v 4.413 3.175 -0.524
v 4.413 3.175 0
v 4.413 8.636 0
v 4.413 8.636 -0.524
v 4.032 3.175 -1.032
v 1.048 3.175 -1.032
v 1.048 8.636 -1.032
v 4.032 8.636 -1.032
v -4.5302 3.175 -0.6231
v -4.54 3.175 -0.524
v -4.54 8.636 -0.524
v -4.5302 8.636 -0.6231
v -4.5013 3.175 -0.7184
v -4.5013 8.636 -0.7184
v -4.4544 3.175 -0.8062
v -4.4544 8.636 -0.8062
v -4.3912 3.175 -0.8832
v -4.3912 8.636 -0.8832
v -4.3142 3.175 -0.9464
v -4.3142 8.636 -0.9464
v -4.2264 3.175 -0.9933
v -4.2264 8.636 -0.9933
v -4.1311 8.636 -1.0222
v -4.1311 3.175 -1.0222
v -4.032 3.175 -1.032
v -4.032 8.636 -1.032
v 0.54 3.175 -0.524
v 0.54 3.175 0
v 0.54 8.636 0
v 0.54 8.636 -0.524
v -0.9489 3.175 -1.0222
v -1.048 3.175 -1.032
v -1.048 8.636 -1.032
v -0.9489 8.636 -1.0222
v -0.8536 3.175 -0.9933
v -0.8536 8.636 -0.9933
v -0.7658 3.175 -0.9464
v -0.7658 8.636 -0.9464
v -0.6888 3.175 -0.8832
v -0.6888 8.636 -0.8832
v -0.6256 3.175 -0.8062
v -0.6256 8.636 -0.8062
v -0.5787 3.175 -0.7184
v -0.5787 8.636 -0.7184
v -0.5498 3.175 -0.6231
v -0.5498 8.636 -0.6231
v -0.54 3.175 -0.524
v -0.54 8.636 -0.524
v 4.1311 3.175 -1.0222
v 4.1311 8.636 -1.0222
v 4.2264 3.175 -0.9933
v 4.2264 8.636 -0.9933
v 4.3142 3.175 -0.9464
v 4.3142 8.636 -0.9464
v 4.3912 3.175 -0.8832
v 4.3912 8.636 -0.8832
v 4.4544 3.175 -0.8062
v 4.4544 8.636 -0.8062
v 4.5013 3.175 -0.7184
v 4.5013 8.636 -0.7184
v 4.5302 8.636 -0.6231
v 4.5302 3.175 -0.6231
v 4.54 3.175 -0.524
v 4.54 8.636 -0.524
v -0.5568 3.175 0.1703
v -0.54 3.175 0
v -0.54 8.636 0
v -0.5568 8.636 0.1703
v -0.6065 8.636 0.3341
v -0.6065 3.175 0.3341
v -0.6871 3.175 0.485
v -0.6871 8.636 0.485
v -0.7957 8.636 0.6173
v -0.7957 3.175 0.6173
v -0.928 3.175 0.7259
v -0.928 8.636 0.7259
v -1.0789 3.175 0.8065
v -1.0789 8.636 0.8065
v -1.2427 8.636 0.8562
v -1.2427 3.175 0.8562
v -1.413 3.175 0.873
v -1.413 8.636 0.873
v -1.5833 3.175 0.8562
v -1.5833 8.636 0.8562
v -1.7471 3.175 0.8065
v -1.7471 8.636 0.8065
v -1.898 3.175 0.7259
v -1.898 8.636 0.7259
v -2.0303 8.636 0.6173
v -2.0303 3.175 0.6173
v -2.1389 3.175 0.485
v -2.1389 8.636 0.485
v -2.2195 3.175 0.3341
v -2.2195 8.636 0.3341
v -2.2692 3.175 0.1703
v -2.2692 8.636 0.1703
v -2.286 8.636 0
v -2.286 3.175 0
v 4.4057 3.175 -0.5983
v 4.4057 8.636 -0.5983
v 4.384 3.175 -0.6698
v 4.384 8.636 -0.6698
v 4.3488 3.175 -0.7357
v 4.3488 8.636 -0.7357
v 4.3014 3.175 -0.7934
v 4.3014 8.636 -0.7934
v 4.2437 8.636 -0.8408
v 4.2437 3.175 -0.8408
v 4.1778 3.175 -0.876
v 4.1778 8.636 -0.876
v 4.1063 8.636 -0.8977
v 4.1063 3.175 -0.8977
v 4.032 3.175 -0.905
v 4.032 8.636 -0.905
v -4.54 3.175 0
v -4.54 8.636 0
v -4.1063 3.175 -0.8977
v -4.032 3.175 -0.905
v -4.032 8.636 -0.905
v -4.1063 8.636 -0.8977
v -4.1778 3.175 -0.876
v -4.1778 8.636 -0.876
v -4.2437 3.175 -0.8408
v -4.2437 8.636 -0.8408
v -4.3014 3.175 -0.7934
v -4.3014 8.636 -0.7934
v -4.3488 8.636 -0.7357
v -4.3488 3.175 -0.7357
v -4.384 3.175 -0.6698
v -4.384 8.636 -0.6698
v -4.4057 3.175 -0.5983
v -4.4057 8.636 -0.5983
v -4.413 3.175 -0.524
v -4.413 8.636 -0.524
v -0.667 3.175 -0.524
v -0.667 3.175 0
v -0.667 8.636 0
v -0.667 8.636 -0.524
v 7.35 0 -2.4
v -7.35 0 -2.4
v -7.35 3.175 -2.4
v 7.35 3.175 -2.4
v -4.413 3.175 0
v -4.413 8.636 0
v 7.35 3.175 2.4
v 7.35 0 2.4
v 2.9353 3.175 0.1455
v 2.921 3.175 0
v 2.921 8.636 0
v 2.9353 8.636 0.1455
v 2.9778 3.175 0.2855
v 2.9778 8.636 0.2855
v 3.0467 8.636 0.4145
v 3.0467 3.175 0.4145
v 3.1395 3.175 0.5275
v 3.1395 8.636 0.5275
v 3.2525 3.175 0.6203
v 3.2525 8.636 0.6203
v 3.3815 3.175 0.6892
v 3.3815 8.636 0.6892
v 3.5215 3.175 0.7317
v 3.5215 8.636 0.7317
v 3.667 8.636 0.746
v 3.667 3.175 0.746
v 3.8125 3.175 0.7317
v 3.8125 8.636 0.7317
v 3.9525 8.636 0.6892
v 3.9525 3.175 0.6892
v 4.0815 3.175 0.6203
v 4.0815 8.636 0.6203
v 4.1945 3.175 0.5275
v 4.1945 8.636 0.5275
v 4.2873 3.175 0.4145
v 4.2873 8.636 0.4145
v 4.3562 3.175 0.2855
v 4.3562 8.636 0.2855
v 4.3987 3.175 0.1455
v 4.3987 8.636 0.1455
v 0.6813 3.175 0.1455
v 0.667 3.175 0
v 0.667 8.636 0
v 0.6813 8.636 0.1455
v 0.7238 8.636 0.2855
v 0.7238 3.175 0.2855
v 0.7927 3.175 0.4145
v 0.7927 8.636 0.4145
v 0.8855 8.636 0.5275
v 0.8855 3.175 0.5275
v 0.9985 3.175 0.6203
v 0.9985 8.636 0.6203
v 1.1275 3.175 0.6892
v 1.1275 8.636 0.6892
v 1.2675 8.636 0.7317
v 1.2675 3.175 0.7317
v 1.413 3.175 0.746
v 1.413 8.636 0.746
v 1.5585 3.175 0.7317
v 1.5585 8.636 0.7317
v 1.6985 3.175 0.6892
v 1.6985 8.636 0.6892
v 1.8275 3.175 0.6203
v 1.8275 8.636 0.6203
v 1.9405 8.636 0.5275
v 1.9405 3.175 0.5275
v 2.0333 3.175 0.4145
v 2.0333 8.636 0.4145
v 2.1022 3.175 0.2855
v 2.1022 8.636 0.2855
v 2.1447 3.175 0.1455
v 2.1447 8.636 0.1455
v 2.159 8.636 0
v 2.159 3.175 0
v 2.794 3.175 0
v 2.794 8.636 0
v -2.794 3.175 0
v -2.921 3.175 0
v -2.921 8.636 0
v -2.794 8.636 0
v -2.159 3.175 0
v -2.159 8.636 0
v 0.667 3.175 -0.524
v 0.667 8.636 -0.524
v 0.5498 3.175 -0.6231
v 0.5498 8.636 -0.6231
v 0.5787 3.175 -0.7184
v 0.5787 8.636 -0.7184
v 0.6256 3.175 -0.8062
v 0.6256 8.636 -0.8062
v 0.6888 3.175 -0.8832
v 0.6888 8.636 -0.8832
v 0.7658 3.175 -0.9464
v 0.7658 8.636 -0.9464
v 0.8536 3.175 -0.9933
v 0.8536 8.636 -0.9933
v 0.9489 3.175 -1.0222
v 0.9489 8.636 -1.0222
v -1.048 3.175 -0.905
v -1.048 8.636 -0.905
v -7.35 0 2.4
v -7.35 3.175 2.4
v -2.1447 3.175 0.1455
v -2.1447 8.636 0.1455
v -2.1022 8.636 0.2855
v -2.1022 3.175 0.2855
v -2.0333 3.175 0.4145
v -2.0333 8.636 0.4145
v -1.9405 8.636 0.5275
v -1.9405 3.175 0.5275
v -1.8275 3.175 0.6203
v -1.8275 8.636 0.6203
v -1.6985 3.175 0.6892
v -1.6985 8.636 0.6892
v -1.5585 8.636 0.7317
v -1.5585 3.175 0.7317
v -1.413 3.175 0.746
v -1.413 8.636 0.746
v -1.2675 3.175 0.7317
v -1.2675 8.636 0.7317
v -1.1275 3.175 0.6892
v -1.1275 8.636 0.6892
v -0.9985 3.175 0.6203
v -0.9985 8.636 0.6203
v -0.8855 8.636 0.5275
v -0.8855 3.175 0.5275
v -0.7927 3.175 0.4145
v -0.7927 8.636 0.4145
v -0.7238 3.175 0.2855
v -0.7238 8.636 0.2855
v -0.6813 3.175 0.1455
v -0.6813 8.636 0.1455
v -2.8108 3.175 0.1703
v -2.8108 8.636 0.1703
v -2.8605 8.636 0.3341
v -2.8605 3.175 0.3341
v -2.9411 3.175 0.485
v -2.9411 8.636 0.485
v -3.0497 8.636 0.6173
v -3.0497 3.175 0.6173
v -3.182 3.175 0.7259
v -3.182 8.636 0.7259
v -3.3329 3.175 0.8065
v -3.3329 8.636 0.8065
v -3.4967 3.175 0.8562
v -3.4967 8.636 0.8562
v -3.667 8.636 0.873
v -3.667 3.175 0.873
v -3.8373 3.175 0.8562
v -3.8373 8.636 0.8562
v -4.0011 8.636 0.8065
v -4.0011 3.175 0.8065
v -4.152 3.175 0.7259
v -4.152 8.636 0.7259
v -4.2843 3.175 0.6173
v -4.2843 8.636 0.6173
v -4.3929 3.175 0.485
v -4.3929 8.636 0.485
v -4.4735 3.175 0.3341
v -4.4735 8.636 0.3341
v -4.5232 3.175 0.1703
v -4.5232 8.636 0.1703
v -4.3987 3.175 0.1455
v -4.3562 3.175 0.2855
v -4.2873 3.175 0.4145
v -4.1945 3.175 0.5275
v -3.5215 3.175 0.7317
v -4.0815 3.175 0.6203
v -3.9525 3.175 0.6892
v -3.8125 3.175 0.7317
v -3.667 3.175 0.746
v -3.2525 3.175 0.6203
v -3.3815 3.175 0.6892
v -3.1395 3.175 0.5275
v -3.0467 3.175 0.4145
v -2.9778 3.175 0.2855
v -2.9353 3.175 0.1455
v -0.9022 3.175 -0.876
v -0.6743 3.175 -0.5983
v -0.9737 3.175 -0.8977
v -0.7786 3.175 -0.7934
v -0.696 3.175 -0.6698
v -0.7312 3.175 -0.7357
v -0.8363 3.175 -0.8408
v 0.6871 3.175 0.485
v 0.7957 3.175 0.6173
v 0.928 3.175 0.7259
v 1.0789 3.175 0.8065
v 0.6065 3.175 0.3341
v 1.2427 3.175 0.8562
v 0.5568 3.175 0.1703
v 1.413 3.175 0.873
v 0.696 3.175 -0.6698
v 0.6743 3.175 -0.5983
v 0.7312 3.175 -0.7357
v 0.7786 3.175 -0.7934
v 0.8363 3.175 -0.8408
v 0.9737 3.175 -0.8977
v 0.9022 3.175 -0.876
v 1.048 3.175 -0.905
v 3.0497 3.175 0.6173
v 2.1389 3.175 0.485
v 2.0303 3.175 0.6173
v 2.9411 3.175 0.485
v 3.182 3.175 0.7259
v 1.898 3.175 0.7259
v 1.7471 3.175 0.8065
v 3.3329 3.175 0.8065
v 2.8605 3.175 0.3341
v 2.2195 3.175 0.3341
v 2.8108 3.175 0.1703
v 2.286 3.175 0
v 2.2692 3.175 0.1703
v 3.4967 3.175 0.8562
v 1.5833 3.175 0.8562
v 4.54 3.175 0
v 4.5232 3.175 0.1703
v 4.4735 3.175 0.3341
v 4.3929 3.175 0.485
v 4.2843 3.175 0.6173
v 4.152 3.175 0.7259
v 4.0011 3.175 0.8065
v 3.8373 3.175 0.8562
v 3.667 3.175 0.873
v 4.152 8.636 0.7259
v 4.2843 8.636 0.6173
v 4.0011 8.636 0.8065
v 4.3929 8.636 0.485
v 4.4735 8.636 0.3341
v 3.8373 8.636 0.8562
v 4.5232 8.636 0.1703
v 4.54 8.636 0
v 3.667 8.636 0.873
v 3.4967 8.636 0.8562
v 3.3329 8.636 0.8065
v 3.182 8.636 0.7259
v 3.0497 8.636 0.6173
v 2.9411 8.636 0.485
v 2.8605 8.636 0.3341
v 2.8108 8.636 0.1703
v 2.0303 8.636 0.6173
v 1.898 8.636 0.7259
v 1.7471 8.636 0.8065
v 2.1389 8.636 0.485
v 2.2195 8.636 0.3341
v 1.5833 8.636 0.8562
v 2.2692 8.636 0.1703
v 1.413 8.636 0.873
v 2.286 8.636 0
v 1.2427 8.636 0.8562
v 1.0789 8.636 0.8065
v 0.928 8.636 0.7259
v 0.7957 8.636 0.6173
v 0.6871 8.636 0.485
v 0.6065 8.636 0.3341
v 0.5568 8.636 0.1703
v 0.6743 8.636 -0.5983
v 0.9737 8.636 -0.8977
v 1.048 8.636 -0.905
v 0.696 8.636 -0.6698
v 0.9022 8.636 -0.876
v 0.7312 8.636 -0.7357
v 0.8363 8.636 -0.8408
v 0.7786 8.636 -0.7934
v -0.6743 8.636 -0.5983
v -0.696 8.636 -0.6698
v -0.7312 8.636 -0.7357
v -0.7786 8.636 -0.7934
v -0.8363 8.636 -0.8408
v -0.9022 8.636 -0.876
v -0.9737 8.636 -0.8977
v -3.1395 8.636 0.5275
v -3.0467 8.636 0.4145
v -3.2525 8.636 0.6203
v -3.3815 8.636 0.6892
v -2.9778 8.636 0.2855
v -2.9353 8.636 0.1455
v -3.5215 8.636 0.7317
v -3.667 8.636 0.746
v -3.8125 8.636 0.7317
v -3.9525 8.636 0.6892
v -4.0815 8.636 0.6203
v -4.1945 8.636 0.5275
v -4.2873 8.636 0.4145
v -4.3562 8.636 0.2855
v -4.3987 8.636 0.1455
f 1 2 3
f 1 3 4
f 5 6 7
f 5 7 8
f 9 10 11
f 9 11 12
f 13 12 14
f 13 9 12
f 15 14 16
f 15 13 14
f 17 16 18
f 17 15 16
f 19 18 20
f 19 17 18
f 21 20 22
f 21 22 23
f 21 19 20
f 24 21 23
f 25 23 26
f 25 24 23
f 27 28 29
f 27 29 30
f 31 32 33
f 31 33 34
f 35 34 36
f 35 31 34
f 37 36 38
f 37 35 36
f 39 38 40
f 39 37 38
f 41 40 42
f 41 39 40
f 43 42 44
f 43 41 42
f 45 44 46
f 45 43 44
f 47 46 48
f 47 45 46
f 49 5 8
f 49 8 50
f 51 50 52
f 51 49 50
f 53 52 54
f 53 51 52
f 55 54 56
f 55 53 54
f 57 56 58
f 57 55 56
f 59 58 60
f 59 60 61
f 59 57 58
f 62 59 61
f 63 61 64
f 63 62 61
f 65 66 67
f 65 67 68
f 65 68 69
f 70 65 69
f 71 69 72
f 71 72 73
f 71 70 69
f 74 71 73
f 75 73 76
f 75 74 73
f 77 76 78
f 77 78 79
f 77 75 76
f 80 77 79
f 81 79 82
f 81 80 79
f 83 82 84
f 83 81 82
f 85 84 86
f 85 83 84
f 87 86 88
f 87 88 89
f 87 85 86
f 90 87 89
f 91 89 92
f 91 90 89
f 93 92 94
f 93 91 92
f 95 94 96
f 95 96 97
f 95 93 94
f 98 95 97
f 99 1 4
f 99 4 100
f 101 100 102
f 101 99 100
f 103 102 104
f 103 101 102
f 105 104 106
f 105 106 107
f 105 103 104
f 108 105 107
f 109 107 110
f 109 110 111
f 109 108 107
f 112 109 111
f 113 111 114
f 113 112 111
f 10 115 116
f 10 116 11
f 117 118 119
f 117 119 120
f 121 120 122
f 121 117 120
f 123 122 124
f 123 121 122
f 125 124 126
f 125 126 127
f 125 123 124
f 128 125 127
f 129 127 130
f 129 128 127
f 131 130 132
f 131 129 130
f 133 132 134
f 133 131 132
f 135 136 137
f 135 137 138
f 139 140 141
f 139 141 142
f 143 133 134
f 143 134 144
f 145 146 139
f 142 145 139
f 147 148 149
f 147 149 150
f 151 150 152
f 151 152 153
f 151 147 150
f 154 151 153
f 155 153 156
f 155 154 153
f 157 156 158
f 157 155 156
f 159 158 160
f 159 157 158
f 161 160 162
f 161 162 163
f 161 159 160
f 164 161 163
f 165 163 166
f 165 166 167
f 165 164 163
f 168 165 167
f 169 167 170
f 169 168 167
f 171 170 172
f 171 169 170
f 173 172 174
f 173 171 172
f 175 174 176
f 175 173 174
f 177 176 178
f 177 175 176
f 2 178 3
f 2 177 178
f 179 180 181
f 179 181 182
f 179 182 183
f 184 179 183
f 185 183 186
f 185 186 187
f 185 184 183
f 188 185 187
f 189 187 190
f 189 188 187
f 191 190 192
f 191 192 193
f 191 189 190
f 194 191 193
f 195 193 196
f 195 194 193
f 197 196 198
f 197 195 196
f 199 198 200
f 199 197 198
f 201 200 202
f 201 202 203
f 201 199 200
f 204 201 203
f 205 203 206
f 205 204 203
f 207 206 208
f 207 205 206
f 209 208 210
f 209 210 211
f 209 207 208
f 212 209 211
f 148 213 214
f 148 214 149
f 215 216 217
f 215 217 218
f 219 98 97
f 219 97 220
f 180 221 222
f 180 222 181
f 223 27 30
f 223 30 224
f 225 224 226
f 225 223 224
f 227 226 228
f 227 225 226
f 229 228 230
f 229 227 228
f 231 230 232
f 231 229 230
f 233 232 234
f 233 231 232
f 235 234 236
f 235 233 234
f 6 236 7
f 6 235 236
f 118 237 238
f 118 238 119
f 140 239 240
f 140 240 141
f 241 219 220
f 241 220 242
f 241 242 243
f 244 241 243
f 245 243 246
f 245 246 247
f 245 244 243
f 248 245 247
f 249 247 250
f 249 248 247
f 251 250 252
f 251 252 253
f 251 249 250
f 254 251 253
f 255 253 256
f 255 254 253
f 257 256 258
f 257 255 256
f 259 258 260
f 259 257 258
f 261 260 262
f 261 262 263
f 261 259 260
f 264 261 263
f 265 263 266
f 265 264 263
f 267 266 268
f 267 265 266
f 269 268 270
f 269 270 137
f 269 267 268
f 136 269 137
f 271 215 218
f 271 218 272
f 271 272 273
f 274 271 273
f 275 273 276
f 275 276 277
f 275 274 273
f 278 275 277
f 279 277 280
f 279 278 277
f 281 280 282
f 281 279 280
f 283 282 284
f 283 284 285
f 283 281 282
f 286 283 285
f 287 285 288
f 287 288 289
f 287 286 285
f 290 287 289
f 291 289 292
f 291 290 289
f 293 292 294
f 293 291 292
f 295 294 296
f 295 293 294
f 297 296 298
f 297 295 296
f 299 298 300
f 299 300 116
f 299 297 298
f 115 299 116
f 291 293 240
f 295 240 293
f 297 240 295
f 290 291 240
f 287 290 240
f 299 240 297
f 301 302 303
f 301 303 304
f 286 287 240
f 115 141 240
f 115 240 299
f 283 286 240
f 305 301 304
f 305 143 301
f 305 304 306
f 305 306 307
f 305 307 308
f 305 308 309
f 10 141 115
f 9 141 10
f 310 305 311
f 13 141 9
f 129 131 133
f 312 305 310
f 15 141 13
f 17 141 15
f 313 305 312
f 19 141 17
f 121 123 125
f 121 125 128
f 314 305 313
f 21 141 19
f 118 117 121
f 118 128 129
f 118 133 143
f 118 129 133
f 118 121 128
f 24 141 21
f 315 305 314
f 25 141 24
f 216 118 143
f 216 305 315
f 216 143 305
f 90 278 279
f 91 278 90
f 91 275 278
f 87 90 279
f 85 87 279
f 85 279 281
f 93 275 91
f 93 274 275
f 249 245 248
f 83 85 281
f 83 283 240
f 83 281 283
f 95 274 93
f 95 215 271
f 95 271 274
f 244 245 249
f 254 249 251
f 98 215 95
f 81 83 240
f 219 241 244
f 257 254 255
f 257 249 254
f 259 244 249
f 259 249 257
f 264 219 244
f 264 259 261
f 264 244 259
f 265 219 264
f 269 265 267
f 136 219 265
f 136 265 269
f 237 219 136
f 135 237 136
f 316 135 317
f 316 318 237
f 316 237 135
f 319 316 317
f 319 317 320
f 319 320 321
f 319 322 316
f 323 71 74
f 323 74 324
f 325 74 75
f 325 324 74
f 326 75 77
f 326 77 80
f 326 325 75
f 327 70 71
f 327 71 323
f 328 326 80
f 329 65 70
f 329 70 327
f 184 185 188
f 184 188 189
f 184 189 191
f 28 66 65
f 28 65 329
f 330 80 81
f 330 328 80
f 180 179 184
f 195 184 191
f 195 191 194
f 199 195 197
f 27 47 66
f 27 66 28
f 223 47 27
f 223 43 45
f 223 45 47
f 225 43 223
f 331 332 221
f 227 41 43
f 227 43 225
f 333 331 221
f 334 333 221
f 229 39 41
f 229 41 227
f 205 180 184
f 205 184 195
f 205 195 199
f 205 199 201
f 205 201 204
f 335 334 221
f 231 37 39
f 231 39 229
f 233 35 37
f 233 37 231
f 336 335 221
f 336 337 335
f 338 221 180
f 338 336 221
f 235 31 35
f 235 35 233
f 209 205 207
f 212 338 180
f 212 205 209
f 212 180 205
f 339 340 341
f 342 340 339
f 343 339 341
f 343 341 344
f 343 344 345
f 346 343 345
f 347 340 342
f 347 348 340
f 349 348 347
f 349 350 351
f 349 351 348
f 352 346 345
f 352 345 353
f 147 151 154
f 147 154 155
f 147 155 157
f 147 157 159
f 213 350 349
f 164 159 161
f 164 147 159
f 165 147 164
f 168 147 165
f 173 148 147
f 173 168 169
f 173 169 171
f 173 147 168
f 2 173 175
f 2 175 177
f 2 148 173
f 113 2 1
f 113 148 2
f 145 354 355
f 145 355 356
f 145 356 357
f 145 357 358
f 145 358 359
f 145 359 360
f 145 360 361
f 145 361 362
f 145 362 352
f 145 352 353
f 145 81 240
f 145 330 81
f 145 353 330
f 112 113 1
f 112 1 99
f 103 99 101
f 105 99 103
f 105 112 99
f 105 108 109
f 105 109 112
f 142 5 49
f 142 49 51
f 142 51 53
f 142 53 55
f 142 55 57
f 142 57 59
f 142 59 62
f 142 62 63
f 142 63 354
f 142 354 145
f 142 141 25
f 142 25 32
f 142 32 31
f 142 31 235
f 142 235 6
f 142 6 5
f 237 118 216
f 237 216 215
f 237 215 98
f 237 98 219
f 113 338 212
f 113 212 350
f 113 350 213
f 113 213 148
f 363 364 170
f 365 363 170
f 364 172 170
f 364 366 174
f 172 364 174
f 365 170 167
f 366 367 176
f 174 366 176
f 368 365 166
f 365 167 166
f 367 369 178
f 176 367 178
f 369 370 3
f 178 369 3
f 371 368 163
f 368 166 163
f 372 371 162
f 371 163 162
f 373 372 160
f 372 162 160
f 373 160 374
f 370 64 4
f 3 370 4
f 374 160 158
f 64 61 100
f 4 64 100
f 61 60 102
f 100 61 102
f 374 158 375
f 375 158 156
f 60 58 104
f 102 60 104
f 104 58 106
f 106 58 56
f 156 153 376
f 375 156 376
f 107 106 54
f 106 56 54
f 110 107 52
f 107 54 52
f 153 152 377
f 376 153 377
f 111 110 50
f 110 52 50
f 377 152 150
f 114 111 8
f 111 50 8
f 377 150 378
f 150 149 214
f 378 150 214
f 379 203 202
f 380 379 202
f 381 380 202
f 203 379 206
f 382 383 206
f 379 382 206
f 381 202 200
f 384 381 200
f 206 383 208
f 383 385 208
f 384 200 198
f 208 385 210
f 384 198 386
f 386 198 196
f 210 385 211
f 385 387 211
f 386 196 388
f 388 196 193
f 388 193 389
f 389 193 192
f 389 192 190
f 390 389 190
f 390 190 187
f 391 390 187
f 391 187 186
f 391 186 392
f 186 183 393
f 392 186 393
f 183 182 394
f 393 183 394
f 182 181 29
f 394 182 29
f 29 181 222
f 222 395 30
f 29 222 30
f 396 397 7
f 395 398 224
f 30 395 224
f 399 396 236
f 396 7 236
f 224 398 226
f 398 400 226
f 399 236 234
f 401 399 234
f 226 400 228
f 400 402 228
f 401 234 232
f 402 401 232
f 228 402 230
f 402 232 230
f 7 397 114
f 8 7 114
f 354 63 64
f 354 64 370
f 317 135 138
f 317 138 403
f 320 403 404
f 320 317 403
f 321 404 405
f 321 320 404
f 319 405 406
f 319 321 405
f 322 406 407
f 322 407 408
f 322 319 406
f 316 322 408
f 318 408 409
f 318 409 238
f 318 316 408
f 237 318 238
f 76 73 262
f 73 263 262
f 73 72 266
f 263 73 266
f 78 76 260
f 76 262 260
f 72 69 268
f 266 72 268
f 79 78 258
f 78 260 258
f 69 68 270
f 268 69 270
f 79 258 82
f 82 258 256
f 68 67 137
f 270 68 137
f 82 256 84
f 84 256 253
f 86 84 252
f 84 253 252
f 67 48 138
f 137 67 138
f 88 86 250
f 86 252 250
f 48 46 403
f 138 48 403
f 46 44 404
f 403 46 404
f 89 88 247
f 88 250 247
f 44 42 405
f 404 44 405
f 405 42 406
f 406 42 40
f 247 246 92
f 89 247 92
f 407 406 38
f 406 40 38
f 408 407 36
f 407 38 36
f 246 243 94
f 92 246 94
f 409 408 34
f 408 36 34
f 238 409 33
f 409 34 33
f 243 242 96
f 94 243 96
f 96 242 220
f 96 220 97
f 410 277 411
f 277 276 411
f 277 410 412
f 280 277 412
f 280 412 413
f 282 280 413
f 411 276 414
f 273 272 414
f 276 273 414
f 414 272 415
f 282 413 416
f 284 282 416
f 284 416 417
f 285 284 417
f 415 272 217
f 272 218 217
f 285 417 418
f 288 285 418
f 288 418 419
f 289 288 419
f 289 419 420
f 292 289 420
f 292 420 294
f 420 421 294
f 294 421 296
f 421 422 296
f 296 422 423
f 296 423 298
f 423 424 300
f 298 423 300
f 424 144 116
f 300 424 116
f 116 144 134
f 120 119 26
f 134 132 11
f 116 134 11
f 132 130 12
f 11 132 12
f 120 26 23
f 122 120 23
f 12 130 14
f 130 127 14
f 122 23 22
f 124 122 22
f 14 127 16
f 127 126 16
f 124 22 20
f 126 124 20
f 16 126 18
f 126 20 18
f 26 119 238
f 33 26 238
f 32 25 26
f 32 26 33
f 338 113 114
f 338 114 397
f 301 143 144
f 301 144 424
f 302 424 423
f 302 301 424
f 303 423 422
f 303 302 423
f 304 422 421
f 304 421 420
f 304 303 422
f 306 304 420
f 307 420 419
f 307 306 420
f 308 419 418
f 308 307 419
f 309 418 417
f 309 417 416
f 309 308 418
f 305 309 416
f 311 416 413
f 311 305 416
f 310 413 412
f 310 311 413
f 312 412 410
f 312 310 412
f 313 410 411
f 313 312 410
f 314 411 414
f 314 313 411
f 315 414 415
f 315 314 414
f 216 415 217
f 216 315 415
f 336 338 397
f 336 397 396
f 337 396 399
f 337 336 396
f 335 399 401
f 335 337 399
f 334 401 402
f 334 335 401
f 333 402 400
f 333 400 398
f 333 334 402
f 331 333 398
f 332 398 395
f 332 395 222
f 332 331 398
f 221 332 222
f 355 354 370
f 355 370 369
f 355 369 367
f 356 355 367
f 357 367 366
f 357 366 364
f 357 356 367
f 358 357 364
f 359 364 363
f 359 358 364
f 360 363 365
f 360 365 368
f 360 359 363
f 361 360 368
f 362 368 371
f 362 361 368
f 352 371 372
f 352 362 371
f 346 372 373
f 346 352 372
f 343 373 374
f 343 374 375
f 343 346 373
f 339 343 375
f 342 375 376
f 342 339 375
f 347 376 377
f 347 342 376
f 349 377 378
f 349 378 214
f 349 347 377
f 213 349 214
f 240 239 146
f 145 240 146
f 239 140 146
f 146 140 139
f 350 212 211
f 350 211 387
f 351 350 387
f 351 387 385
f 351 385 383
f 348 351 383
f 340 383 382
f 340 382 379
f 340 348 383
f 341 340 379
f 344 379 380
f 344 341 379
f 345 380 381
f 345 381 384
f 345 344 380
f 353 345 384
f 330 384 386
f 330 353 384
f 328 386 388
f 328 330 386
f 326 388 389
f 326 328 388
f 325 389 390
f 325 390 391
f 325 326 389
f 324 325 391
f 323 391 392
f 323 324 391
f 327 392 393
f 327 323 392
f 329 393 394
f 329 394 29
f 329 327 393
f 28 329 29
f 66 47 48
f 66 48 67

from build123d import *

# Parameters (mm, degrees)
SKETCH1_W           = 14.7
SKETCH1_H           = 4.8
BOSS_EXTRUDE1_DEPTH = 3.175
BOSS_EXTRUDE2_DEPTH = 5.461


with BuildPart() as part:
    # Sketch1 → Boss-Extrude1 (new body)
    with BuildSketch(Plane(origin=(0, 0, 0), x_dir=(1, 0, 0), z_dir=(0, 1, 0))):
        Rectangle(SKETCH1_W, SKETCH1_H)
    extrude(amount=BOSS_EXTRUDE1_DEPTH)

    # Sketch2 → Boss-Extrude2 (add)
    with BuildSketch(Plane(origin=(0, 3.175, 0), x_dir=(1, 0, 0), z_dir=(0, 1, 0))):
        with BuildLine():
            Line((-4.032, 1.032), (-1.048, 1.032))
            ThreePointArc((-1.048, 1.032), (-0.688789755, 0.883210245), (-0.54, 0.524))
            Line((-0.54, 0.524), (-0.54, 0))
            ThreePointArc((-0.54, 0), (-1.413, -0.873), (-2.286, 0))
            Line((-2.286, 0), (-2.159, 0))
            ThreePointArc((-2.159, 0), (-1.413, -0.746), (-0.667, 0))
            Line((-0.667, 0), (-0.667, 0.524))
            ThreePointArc((-0.667, 0.524), (-0.778592316, 0.793407684), (-1.048, 0.905))
            Line((-1.048, 0.905), (-4.032, 0.905))
            ThreePointArc((-4.032, 0.905), (-4.301407684, 0.793407684), (-4.413, 0.524))
            Line((-4.413, 0.524), (-4.413, 0))
            ThreePointArc((-4.413, 0), (-3.667, -0.746), (-2.921, 0))
            Line((-2.921, 0), (-2.794, 0))
            ThreePointArc((-2.794, 0), (-3.667, -0.873), (-4.54, 0))
            Line((-4.54, 0), (-4.54, 0.524))
            ThreePointArc((-4.54, 0.524), (-4.391210245, 0.883210245), (-4.032, 1.032))
        make_face()
        with BuildLine():
            Line((4.54, 0.524), (4.54, 0))
            ThreePointArc((4.54, 0), (3.667, -0.873), (2.794, 0))
            Line((2.794, 0), (2.921, 0))
            ThreePointArc((2.921, 0), (3.667, -0.746), (4.413, 0))
            Line((4.413, 0), (4.413, 0.524))
            ThreePointArc((4.413, 0.524), (4.301407684, 0.793407684), (4.032, 0.905))
            Line((4.032, 0.905), (1.048, 0.905))
            ThreePointArc((1.048, 0.905), (0.778592316, 0.793407684), (0.667, 0.524))
            Line((0.667, 0.524), (0.667, 0))
            ThreePointArc((0.667, 0), (1.413, -0.746), (2.159, 0))
            Line((2.159, 0), (2.286, 0))
            ThreePointArc((2.286, 0), (1.413, -0.873), (0.54, 0))
            Line((0.54, 0), (0.54, 0.524))
            ThreePointArc((0.54, 0.524), (0.688789755, 0.883210245), (1.048, 1.032))
            Line((1.048, 1.032), (4.032, 1.032))
            ThreePointArc((4.032, 1.032), (4.391210245, 0.883210245), (4.54, 0.524))
        make_face()
    extrude(amount=BOSS_EXTRUDE2_DEPTH)


solid = part.part
